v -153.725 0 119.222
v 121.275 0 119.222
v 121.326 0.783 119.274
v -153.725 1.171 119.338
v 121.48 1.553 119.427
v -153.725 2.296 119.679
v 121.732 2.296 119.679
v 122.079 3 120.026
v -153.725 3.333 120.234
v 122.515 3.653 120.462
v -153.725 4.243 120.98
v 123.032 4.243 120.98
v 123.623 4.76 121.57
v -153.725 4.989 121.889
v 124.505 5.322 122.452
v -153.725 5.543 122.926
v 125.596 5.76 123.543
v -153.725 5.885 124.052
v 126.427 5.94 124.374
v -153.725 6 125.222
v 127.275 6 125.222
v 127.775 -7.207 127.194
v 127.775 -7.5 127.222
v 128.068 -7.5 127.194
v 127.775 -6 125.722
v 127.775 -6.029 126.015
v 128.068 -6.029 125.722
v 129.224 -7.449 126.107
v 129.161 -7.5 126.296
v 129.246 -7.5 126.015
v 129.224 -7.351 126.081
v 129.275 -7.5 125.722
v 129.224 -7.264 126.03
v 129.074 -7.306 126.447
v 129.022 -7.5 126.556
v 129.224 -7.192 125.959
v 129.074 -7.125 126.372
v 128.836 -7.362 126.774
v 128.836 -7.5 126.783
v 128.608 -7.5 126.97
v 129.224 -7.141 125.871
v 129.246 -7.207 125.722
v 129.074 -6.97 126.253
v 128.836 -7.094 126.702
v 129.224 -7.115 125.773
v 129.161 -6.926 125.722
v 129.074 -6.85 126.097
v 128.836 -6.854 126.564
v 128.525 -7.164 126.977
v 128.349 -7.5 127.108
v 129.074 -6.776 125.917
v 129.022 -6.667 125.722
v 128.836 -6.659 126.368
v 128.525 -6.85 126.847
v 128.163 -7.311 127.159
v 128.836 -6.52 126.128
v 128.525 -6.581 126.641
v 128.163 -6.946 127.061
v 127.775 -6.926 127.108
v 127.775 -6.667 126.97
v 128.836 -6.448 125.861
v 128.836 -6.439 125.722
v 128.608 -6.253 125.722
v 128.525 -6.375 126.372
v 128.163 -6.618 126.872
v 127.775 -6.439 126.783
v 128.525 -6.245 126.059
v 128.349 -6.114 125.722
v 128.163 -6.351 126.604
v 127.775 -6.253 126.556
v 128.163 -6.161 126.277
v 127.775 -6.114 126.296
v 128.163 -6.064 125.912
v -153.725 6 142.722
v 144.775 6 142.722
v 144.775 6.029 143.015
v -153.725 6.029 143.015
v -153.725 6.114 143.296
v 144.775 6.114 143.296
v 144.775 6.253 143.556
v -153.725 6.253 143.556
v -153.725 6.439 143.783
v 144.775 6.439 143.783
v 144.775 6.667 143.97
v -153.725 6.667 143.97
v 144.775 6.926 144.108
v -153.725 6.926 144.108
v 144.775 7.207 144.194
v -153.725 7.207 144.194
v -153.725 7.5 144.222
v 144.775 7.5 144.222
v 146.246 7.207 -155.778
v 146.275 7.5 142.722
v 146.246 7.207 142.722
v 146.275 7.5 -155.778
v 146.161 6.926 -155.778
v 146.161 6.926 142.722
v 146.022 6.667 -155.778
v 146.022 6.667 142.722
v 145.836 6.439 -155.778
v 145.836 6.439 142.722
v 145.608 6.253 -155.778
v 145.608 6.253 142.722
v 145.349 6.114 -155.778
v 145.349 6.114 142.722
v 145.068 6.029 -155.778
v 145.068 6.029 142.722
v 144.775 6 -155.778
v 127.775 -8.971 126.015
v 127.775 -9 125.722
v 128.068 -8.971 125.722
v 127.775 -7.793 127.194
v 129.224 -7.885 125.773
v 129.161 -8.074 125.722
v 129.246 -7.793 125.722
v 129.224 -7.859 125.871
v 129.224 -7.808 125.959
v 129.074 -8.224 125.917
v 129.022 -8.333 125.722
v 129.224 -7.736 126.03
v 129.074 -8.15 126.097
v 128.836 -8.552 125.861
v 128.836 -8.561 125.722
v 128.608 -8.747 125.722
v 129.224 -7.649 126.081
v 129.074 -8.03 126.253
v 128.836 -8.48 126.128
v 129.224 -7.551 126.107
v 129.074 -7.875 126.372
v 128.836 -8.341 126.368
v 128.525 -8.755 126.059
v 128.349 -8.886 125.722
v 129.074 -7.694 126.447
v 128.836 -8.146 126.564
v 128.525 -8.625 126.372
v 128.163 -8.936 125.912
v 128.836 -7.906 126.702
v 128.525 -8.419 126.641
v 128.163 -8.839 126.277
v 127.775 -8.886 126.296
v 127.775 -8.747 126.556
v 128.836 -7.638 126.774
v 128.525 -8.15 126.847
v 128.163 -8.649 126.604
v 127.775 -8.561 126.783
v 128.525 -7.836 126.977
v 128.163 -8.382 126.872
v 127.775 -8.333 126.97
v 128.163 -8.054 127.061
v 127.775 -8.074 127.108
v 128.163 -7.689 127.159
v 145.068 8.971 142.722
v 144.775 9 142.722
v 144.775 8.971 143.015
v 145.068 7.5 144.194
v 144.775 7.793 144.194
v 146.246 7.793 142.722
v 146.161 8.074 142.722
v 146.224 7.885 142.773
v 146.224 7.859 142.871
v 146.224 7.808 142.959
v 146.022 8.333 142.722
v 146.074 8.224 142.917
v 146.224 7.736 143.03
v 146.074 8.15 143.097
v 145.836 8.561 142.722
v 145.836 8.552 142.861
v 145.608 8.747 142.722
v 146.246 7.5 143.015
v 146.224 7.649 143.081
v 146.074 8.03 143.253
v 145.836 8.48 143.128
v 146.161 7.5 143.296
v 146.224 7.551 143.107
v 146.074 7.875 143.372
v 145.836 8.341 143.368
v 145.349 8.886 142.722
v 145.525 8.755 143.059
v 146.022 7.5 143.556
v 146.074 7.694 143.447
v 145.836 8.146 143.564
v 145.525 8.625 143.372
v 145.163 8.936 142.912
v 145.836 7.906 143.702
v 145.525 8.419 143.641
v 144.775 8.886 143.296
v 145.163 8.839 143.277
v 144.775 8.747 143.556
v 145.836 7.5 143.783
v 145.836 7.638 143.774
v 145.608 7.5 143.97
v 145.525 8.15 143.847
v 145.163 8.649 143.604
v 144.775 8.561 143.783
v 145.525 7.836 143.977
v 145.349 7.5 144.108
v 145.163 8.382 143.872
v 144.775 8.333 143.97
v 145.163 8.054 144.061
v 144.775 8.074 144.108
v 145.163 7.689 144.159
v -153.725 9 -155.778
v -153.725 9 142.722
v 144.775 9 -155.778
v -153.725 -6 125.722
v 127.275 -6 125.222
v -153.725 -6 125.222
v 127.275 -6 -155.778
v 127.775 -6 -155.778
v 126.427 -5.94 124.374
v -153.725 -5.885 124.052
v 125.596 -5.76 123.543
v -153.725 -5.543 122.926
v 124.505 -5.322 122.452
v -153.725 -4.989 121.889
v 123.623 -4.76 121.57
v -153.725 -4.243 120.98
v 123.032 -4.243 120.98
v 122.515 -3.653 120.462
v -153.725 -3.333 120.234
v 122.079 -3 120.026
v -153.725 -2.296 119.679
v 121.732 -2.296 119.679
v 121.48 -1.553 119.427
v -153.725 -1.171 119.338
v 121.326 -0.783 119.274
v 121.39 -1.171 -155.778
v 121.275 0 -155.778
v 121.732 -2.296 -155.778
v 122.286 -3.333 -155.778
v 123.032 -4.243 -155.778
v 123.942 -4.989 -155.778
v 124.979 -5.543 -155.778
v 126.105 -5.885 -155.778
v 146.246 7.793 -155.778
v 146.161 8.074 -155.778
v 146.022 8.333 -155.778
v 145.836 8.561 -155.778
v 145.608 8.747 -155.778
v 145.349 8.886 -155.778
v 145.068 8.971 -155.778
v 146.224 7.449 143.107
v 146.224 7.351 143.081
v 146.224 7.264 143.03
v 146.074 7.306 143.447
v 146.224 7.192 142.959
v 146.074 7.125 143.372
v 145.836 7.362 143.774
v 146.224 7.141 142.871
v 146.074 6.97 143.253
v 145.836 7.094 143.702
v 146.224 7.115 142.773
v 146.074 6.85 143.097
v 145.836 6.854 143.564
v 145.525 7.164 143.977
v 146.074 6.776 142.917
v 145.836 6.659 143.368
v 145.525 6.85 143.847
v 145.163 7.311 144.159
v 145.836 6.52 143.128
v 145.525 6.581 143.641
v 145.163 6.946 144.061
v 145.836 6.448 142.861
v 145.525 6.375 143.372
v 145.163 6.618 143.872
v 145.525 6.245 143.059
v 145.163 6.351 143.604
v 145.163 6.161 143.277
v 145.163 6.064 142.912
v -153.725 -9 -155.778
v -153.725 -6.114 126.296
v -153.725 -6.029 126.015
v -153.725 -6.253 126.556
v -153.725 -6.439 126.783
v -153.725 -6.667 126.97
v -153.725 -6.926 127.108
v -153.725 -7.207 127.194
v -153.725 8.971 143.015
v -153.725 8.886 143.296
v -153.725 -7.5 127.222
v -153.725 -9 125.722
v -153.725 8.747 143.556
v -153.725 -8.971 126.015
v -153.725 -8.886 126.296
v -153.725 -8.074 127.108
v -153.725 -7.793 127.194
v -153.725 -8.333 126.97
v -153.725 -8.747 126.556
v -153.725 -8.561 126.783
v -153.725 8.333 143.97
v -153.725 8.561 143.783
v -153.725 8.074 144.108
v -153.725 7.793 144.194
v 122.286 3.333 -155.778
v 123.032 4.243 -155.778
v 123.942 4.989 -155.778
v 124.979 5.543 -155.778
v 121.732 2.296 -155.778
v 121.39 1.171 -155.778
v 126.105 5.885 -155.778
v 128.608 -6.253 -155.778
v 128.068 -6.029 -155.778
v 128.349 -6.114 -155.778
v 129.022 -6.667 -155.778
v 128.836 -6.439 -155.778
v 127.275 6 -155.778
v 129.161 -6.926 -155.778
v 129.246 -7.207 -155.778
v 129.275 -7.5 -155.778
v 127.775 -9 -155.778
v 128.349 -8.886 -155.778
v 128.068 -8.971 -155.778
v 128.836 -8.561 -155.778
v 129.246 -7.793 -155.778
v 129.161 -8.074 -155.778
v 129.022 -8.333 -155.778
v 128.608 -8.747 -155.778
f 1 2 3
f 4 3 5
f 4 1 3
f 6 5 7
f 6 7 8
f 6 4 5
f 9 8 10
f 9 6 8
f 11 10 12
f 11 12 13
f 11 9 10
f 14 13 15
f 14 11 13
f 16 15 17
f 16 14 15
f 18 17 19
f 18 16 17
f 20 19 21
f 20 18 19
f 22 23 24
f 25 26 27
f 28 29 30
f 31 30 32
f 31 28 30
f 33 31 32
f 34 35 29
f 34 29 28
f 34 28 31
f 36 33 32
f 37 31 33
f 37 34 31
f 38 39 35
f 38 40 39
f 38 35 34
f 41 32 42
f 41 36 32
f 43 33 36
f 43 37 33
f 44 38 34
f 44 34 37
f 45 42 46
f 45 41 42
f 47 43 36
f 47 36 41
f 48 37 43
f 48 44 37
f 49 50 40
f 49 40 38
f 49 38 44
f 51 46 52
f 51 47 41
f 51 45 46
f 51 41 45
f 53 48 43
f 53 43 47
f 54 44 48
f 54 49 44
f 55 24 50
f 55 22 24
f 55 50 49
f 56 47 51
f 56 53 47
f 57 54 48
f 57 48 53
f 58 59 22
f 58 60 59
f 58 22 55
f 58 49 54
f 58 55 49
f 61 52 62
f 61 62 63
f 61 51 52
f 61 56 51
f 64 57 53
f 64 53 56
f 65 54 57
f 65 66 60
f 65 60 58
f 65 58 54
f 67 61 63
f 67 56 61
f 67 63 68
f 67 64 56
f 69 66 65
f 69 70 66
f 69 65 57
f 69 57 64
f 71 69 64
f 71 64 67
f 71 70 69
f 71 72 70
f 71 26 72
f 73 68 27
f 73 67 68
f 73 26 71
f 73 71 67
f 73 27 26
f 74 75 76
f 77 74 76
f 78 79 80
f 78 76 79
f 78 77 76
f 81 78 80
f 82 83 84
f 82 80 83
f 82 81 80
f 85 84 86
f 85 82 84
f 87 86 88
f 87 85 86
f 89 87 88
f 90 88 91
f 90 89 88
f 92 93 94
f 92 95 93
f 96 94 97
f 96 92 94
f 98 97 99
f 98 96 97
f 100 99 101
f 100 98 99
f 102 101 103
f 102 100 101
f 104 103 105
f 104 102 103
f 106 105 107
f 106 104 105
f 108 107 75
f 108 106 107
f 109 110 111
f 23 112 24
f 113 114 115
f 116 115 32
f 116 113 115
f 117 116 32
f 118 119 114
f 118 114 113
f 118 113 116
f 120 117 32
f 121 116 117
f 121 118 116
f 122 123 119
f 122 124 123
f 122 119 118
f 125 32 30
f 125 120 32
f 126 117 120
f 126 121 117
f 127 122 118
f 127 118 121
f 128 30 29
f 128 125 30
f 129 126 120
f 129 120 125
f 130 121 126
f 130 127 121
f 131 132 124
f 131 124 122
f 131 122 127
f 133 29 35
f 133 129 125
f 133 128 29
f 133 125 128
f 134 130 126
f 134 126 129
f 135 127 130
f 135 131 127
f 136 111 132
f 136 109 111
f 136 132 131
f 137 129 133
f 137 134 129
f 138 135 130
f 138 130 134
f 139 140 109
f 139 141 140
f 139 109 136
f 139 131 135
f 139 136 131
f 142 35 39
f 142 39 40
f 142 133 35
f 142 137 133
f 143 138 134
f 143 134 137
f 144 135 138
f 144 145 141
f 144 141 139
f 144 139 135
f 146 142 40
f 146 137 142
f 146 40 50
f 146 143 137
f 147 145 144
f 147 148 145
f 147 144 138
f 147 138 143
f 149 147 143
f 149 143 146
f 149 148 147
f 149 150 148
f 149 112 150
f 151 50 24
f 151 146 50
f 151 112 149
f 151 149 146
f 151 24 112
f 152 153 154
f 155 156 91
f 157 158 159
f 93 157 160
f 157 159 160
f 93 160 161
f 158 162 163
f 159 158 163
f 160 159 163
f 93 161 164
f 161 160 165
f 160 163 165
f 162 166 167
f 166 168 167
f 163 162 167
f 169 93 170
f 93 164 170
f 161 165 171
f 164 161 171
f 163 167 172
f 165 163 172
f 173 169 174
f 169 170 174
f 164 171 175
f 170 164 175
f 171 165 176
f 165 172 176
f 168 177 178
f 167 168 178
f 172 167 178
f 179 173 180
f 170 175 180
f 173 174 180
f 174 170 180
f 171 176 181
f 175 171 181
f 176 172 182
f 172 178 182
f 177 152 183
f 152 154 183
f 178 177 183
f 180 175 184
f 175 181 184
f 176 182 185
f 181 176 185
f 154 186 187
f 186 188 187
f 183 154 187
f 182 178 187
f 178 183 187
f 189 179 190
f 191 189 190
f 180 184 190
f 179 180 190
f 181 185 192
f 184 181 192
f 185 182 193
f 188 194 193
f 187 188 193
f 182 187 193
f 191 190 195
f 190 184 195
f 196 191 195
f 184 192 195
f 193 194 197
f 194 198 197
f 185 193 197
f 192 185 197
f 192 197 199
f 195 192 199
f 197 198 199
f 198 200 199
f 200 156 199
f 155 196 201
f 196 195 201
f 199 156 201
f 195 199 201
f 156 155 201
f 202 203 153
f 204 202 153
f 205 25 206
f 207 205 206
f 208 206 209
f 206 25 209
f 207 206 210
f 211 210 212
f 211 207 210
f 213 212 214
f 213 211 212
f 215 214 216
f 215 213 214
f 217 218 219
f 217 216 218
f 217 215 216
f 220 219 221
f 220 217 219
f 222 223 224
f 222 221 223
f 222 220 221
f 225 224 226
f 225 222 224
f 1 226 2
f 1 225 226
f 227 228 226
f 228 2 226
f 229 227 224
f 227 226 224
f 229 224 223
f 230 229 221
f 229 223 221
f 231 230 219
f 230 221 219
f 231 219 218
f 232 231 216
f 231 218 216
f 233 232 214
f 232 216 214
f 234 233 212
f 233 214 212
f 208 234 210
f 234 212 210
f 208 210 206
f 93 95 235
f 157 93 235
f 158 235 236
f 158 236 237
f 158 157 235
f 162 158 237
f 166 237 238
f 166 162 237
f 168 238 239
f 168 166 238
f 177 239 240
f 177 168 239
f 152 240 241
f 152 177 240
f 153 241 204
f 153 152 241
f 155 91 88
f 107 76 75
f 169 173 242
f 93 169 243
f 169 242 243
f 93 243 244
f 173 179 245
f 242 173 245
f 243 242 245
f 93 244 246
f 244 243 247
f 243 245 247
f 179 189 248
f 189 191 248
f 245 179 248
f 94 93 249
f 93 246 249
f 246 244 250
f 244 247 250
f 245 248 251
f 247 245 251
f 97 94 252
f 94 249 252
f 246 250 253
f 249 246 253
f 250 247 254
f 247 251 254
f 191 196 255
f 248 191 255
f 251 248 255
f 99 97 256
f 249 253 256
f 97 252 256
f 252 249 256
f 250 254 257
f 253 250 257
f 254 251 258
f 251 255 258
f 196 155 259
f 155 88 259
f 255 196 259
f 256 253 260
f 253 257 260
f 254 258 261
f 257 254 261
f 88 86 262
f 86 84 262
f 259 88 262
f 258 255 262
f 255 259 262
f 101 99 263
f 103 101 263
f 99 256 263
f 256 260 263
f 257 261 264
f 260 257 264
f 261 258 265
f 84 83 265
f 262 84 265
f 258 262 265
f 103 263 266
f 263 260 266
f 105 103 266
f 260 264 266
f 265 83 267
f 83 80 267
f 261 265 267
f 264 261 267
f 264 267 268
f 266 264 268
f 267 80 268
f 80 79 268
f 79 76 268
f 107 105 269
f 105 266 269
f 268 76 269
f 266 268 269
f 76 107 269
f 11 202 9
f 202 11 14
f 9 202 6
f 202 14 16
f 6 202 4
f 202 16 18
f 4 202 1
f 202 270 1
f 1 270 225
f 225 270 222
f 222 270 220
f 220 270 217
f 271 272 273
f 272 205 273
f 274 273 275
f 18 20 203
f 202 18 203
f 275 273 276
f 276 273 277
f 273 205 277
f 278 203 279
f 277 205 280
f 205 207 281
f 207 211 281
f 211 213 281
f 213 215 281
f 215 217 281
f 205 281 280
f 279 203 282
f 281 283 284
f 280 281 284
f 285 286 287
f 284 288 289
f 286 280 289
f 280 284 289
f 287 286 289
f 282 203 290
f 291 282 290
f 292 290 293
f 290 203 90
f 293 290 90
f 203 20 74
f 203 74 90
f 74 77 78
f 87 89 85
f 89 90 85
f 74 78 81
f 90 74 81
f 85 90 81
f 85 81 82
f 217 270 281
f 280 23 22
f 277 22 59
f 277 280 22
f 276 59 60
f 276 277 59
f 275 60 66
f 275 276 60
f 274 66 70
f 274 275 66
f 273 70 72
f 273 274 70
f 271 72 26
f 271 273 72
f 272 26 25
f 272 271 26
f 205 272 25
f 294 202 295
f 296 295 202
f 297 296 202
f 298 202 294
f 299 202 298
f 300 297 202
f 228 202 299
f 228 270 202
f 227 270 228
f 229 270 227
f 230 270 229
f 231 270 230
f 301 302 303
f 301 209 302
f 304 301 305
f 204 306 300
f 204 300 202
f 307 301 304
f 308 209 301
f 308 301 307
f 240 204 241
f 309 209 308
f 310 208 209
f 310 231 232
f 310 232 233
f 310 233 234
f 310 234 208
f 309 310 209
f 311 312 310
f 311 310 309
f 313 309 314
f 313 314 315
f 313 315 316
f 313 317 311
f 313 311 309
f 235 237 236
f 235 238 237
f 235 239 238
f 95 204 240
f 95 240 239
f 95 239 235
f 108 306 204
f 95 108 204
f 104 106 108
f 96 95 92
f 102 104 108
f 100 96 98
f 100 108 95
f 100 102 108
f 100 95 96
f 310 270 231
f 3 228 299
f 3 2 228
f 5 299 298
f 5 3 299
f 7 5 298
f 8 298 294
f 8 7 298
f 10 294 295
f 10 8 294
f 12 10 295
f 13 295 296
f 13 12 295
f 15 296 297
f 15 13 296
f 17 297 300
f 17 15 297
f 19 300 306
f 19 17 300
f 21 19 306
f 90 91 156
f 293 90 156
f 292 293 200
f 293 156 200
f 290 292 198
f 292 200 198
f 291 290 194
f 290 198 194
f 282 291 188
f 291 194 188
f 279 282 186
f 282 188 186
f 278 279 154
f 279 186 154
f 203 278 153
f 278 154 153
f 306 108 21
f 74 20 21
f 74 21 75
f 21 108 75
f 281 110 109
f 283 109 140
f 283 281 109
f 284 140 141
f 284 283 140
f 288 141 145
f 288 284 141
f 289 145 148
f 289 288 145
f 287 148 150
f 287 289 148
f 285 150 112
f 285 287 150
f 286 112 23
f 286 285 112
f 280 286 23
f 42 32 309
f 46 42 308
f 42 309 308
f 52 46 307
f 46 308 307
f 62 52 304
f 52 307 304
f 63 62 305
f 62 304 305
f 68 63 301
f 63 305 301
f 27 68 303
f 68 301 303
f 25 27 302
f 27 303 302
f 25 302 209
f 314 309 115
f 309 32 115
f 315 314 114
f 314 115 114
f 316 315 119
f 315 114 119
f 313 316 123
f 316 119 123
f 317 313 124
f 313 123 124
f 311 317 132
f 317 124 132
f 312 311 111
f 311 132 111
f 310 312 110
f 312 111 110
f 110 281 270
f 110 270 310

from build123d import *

# Parameters (mm, degrees)
F0_W     = 300
F0_H     = 300
F1_DEPTH = 9
F3_DEPTH = 300.001
F4_R     = 1.49999
F5_R     = 5.99999
F7_DEPTH = 300.001
F8_R     = 5.99999
F9_R     = 1.49999


# Not quite as in the source:
# - a fillet or chamfer is up to 0.001 mm smaller than in the source, because OpenCascade refuses the exact size


with BuildPart() as f1:
    # F0 (on Front) → F1 (new body, symmetric)
    with BuildSketch(Plane.XZ):
        with Locations((-3.7248600274, -5.7776198197)):
            Rectangle(F0_W, F0_H)
    extrude(amount=F1_DEPTH, both=True)

    # F2 (on face) → F3 (cut, through all)
    with BuildSketch(Plane.YZ.offset(146.2751399726)):
        Polygon((6, 144.2223801803), (-9, 144.2223801803), (-9, 127.2223801803), (-6, 127.2223801803), (-6, 119.2223801803), (6, 119.2223801803), align=None)
    extrude(amount=-F3_DEPTH, mode=Mode.SUBTRACT)

    # F4 (radius 1.5 in the source; OpenCascade refuses exactly that, so slightly less here)
    f4_edges = [f1.edges().sort_by_distance(p)[0] for p in [
        (-3.72486, 6, 144.22238),
        (-3.72486, 9, 144.22238),
        (-3.72486, -9, 127.22238),
        (-3.72486, -6, 127.22238),
    ]]
    fillet(f4_edges, radius=F4_R)

    # F5 (radius 6 in the source; OpenCascade refuses exactly that, so slightly less here)
    f5_edges = [f1.edges().sort_by_distance(p)[0] for p in [
        (-3.72486, 6, 119.22238),
        (-3.72486, -6, 119.22238),
    ]]
    fillet(f5_edges, radius=F5_R)

    # F6 (on face) → F7 (cut, through all)
    with BuildSketch(Plane(origin=(0, 0, -155.7776198197), x_dir=(1, 0, 0), z_dir=(0, 0, -1))):
        Polygon((146.2751399726, -6), (146.2751399726, 9), (129.2751399726, 9), (129.2751399726, 6), (121.2751399726, 6), (121.2751399726, -6), align=None)
    extrude(amount=-F7_DEPTH, mode=Mode.SUBTRACT)

    # F8 (radius 6 in the source; OpenCascade refuses exactly that, so slightly less here)
    f8_edges = [f1.edges().sort_by_distance(p)[0] for p in [
        (121.27514, 6, -15.277625),
        (121.27514, -6, -15.277625),
    ]]
    fillet(f8_edges, radius=F8_R)

    # F9 (radius 1.5 in the source; OpenCascade refuses exactly that, so slightly less here)
    f9_edges = [f1.edges().sort_by_distance(p)[0] for p in [
        (129.27514, -6, -15.027615),
        (146.27514, 9, -6.527615),
    ]]
    fillet(f9_edges, radius=F9_R)


solid = f1.part
